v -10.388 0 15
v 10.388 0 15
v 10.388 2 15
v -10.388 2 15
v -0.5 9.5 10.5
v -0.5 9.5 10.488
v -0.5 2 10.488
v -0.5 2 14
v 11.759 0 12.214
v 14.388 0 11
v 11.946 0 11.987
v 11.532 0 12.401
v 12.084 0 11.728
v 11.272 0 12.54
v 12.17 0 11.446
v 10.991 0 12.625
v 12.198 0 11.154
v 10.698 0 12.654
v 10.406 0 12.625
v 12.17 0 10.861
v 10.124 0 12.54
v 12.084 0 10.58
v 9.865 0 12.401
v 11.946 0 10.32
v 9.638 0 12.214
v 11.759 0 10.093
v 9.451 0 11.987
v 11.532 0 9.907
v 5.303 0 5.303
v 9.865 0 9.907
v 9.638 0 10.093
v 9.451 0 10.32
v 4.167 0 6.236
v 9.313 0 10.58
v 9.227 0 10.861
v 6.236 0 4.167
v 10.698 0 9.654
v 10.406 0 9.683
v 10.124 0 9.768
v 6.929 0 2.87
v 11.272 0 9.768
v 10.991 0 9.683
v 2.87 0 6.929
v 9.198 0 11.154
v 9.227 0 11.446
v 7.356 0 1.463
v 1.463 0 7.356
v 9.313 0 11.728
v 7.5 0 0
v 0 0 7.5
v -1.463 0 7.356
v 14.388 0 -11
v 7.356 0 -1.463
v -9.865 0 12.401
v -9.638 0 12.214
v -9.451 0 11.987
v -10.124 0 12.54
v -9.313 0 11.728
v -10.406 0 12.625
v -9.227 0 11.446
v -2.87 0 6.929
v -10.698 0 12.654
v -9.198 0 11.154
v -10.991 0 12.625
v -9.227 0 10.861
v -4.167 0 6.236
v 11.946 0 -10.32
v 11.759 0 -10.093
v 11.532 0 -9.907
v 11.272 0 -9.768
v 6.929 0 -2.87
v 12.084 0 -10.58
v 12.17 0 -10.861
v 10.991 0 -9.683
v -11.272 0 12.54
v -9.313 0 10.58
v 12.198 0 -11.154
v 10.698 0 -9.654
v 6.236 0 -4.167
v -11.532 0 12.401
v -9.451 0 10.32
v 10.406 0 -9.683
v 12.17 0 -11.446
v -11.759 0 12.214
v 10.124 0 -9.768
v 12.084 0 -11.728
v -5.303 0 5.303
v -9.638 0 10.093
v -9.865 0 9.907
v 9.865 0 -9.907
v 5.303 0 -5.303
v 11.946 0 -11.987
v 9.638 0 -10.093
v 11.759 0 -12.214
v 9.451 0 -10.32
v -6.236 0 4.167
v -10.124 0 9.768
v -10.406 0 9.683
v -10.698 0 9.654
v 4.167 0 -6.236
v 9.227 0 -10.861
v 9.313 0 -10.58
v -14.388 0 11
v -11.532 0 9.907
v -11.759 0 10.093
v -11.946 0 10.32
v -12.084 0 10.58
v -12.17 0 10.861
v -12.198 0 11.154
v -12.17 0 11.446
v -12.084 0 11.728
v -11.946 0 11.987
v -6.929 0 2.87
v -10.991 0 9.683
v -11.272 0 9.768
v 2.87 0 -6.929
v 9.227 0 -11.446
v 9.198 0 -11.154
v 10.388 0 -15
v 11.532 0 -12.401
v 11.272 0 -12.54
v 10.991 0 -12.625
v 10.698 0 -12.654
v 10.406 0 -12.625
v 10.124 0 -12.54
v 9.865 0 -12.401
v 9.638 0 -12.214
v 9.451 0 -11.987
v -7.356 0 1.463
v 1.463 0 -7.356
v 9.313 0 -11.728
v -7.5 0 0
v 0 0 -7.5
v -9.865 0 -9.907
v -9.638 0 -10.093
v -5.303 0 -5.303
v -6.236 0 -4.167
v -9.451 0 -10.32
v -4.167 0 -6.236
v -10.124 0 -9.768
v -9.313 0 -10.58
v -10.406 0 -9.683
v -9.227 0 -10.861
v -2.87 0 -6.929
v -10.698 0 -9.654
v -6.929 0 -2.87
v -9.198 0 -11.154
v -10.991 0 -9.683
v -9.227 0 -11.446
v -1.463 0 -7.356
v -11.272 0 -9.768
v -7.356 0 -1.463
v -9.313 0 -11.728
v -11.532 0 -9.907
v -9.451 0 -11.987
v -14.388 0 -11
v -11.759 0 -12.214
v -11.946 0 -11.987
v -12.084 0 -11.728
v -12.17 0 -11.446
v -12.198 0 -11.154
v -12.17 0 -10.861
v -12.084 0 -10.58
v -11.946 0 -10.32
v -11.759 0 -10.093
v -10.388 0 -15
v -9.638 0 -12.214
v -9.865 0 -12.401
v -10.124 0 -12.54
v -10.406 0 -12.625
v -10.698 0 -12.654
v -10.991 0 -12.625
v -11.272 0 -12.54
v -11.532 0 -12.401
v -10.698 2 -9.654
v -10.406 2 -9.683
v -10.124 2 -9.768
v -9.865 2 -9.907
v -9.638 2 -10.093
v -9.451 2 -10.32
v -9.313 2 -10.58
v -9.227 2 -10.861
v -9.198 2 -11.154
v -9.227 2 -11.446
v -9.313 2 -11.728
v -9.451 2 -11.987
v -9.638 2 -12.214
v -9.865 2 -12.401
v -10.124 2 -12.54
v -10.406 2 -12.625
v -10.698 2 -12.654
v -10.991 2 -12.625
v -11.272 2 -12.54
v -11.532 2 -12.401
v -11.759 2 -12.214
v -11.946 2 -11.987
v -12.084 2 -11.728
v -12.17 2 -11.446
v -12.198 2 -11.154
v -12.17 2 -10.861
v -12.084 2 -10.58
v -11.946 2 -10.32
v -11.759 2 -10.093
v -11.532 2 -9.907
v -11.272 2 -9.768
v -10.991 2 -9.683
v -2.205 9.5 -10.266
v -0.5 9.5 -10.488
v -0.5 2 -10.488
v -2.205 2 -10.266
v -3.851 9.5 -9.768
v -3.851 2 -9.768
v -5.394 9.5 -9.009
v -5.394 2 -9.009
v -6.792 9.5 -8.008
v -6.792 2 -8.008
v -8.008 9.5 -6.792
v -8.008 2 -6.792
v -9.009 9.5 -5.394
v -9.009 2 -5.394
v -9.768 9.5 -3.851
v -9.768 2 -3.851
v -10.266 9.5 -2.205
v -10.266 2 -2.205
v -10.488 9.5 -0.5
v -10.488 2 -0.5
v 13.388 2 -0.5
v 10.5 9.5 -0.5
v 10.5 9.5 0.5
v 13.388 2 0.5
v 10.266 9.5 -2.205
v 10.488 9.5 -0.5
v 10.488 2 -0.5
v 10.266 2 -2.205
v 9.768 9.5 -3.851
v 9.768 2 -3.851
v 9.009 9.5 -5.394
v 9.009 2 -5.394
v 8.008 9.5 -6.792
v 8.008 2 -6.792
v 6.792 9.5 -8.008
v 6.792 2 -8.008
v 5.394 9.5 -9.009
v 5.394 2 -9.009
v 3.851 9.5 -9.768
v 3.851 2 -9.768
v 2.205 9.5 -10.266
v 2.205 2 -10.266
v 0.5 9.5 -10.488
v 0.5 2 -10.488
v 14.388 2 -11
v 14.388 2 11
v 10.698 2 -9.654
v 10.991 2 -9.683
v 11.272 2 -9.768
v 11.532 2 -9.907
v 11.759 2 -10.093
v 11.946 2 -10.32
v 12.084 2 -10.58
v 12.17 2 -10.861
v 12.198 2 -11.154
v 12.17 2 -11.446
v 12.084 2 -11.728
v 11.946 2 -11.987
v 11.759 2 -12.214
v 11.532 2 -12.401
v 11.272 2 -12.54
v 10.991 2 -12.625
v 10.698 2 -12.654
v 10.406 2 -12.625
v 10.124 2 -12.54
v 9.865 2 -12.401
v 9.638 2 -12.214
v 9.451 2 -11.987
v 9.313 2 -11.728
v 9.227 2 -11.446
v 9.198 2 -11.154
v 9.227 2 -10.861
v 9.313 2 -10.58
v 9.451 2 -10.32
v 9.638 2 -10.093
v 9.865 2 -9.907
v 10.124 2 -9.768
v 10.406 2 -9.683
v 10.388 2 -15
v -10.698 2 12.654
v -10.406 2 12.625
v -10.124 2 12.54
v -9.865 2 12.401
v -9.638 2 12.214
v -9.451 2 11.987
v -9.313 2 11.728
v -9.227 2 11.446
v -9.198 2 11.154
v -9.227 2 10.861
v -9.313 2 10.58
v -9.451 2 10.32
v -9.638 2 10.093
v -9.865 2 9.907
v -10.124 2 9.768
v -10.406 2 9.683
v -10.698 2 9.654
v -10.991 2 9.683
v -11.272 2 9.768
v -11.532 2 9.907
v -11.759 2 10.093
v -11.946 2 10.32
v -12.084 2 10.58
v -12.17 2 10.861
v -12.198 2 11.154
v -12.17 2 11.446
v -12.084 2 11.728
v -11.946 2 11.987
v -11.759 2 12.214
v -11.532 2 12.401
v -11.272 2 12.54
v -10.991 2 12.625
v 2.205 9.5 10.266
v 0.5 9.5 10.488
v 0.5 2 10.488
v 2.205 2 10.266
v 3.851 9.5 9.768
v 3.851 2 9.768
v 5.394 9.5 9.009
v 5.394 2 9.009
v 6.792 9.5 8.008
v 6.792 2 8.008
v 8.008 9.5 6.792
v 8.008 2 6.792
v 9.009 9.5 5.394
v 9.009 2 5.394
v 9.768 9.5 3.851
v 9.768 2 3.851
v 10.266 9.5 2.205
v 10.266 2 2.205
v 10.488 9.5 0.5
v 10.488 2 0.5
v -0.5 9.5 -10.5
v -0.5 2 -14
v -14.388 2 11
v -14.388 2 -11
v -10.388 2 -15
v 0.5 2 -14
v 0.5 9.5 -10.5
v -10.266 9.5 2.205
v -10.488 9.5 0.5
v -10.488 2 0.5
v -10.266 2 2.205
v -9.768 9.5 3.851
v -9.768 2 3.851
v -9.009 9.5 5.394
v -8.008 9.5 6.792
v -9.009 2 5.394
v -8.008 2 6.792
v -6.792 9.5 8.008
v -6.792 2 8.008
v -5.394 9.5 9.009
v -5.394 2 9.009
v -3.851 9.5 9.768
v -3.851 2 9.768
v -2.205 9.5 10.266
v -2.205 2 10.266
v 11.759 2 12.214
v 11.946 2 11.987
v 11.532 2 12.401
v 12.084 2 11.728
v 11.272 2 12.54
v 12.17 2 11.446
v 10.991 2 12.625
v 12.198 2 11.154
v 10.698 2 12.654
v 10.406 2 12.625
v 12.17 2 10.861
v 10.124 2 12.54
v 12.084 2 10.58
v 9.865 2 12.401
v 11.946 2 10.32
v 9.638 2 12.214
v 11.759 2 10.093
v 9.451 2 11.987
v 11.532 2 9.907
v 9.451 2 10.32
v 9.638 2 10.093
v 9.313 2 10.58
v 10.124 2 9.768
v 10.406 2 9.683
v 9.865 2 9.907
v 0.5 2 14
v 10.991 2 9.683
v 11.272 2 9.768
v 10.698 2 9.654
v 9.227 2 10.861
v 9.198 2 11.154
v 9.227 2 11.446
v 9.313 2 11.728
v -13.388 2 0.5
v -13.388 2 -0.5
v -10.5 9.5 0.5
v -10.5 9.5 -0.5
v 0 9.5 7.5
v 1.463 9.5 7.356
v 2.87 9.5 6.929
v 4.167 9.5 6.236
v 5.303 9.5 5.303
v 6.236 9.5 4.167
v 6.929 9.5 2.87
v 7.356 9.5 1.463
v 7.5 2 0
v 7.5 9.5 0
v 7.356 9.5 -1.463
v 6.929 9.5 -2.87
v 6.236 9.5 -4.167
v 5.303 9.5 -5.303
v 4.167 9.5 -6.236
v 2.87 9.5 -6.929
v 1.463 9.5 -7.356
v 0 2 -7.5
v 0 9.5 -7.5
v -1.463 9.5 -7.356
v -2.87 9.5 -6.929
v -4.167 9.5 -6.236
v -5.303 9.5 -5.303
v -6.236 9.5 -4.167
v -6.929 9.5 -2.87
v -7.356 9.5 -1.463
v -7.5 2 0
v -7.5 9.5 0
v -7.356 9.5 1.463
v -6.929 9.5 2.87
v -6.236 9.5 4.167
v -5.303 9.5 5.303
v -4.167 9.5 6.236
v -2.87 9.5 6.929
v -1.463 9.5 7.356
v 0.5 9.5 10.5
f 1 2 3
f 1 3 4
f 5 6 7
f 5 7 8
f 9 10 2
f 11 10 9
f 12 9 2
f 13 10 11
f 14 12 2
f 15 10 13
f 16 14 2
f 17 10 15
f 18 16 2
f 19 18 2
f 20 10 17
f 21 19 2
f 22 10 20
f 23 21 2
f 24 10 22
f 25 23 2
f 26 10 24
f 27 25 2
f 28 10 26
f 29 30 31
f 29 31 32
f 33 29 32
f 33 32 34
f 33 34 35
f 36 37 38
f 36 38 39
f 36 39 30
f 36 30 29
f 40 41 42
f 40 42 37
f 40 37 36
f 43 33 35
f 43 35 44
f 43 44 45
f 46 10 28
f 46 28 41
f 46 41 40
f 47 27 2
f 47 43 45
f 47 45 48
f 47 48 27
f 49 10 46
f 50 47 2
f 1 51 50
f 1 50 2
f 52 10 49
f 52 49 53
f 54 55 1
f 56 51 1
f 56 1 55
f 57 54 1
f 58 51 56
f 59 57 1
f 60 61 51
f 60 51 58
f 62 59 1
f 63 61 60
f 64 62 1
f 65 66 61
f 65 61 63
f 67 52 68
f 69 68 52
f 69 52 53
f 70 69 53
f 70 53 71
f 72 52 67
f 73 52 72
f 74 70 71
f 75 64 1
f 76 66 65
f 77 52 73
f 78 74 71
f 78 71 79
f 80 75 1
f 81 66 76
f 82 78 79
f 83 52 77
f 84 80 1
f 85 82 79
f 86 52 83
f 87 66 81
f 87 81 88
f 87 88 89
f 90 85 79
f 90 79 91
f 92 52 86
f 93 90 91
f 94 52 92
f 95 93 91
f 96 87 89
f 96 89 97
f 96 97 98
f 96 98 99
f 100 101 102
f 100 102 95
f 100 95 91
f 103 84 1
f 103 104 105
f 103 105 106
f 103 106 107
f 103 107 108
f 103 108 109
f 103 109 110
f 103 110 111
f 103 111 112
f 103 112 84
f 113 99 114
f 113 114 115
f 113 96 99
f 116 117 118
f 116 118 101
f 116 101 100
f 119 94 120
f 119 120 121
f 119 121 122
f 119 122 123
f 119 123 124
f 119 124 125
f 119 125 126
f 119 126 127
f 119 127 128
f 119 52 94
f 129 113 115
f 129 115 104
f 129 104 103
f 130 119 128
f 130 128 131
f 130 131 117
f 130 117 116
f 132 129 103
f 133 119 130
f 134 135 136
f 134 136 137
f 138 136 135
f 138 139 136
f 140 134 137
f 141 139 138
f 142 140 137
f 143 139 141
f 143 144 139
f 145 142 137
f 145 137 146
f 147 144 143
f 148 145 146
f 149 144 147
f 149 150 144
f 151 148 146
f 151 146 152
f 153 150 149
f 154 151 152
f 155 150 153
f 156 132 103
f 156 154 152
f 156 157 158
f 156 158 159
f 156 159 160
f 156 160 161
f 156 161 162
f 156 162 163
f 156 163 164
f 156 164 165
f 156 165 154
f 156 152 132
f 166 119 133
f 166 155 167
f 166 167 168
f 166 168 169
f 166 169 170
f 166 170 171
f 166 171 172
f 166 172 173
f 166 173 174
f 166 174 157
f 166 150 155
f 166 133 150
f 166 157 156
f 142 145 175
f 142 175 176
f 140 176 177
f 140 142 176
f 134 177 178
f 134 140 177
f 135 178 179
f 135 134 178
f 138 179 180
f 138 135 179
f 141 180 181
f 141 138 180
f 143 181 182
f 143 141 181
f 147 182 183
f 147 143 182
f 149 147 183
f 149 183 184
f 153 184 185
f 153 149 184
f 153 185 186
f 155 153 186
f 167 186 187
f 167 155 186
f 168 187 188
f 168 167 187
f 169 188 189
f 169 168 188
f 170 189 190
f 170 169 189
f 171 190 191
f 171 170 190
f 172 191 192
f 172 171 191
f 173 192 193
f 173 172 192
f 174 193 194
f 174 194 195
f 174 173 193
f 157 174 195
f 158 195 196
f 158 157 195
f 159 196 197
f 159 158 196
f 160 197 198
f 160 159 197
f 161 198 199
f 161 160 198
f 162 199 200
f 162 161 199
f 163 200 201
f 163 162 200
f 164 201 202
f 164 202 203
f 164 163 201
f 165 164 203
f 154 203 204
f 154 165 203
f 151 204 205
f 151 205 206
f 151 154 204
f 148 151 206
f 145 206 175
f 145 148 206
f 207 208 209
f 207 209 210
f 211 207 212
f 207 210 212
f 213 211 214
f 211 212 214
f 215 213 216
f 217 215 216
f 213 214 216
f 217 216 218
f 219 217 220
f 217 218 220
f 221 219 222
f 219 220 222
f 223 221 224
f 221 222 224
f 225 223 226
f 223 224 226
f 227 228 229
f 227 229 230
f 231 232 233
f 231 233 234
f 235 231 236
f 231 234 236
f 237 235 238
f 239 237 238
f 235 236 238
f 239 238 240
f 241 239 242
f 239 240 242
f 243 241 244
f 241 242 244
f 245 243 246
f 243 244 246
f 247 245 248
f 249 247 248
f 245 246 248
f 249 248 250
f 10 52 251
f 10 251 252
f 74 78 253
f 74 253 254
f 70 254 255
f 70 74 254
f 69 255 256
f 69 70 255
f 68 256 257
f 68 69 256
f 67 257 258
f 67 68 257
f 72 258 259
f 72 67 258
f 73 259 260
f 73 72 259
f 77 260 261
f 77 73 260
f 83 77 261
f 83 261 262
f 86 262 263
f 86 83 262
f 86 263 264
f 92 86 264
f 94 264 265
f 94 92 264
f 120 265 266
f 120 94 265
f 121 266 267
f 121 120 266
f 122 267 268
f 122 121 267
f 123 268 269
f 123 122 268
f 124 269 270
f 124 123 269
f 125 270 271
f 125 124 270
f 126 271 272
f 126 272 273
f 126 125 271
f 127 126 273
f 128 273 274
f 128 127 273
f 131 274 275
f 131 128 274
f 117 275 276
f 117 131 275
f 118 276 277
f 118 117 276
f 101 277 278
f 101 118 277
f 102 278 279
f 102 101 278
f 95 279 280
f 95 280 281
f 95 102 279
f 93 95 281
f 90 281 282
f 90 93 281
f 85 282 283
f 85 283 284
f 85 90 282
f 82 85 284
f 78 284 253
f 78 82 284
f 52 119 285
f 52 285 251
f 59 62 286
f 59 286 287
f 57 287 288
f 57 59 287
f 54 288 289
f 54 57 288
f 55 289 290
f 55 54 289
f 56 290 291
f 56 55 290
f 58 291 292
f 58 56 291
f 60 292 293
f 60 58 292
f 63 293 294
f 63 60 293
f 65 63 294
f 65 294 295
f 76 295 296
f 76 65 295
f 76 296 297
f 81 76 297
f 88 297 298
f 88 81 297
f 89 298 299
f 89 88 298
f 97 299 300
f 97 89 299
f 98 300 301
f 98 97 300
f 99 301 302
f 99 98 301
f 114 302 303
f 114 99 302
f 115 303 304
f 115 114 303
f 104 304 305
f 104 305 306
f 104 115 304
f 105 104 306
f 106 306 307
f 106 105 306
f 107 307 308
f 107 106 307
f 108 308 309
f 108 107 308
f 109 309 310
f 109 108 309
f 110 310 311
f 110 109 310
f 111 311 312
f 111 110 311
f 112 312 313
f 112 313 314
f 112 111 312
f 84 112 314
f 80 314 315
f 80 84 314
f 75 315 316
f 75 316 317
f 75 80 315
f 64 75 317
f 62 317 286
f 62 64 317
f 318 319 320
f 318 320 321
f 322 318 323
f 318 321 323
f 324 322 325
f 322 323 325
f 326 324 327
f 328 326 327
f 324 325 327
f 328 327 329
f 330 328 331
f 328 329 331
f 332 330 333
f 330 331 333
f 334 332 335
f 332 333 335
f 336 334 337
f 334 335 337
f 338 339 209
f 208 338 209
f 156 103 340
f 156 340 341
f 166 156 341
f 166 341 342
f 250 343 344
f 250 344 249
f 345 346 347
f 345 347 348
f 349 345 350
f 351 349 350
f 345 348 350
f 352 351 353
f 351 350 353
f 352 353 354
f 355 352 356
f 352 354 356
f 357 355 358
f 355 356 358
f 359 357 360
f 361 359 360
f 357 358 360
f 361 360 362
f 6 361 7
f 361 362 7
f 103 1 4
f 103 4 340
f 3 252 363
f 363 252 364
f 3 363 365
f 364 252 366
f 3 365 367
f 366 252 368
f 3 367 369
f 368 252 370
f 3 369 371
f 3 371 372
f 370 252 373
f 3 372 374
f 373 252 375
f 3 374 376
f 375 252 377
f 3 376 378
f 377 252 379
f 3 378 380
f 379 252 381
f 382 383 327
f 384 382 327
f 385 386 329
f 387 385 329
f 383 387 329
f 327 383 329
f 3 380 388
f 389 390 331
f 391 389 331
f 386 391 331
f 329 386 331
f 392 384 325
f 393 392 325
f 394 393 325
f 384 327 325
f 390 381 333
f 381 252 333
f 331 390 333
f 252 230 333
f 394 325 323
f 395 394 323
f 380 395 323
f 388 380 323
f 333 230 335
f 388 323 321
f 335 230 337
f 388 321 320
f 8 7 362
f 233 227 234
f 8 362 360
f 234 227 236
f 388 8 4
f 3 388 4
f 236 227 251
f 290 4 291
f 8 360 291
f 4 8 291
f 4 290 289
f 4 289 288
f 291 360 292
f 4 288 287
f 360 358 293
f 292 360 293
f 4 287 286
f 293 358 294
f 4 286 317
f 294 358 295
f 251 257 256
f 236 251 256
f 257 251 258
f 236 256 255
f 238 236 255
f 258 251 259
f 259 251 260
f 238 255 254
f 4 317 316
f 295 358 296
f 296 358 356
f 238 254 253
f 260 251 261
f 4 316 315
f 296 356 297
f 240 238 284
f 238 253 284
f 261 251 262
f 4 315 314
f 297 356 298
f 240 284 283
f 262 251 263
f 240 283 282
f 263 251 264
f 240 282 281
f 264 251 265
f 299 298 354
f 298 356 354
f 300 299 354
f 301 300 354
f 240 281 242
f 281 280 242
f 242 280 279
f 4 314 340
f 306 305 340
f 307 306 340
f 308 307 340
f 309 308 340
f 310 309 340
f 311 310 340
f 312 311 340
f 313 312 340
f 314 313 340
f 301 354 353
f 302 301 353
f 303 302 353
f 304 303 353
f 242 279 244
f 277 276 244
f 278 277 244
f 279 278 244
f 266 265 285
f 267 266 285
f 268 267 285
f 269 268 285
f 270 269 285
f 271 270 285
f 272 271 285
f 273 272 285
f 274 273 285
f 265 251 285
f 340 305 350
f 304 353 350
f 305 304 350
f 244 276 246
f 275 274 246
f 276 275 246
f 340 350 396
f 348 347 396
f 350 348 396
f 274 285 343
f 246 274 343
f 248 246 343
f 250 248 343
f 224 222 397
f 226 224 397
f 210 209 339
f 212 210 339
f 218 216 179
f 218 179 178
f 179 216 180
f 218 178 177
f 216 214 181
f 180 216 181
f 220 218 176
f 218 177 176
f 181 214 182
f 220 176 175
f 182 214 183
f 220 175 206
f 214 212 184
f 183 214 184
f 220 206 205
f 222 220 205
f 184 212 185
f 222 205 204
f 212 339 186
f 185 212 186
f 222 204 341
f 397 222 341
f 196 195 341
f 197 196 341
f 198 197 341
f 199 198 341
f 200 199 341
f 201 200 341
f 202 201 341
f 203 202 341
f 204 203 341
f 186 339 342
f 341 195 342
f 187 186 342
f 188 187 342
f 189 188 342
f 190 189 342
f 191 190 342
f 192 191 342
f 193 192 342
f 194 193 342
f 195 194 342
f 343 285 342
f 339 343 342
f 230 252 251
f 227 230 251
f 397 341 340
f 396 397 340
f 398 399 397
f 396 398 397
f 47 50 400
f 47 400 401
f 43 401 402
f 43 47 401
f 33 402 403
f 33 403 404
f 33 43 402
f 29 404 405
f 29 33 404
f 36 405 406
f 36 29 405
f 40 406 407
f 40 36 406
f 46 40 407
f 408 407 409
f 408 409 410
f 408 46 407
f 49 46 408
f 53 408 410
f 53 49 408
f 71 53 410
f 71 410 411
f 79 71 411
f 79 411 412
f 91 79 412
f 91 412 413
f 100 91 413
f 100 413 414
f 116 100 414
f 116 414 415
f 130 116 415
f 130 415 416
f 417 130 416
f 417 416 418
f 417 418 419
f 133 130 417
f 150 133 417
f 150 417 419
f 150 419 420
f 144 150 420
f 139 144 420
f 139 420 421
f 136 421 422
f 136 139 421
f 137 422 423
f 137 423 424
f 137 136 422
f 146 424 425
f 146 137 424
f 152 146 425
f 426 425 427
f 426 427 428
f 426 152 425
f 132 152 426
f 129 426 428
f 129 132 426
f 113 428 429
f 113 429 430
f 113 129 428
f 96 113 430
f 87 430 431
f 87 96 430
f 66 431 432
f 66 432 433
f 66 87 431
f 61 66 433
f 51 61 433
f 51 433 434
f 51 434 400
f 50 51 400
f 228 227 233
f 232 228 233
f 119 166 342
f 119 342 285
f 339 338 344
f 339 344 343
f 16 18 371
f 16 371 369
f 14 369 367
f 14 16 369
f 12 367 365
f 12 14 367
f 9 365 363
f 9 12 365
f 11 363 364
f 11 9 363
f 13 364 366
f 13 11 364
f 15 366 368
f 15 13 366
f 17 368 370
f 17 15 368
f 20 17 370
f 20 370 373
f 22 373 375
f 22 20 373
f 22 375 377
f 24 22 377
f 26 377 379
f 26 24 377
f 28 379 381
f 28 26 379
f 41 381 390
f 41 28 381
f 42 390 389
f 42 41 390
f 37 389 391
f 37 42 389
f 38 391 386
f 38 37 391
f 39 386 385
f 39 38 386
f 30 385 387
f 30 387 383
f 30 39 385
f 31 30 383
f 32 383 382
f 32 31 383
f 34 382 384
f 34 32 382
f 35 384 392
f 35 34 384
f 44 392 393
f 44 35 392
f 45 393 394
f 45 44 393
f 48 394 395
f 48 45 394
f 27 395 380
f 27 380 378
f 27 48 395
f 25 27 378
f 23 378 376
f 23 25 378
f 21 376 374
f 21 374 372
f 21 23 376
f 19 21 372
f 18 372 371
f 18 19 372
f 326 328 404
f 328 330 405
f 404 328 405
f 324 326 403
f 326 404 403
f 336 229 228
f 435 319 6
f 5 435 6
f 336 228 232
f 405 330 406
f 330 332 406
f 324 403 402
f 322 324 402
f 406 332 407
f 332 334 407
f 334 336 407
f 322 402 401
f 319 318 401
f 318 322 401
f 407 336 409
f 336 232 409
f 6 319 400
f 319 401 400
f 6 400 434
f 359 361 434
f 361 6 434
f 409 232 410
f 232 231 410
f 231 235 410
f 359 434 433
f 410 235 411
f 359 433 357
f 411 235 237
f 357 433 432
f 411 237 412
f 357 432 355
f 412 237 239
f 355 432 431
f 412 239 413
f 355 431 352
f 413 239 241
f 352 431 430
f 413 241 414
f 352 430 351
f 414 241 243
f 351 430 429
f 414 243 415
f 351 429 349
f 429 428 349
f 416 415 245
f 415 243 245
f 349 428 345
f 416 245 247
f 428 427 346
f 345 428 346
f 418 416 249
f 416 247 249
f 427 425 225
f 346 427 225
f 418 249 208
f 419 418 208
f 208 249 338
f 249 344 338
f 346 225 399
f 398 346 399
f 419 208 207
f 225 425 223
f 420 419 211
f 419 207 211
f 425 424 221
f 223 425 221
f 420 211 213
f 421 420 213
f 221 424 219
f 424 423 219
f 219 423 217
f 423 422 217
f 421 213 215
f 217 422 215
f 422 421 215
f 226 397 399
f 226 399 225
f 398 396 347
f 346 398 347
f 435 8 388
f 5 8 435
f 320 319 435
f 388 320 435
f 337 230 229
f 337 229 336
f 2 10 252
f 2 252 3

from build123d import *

# Parameters (mm, degrees)
SKETCH1_R                = 7.5
SKETCH1_R_2              = 1.5
BOSS_EXTRUDE1_DEPTH      = 2
SKETCH2_R                = 10.5
SKETCH2_R_2              = 7.5
BOSS_EXTRUDE2_DEPTH      = 7.5
BOSS_EXTRUDE4_DEPTH      = 0.5
BOSS_EXTRUDE4_DEPTH_BACK = 0.5
BOSS_EXTRUDE5_DEPTH      = 0.5
BOSS_EXTRUDE5_DEPTH_BACK = 0.5


with BuildPart() as part:
    # Sketch1 → Boss-Extrude1 (new body)
    with BuildSketch(Plane(origin=(0, 0, 0), x_dir=(1, 0, 0), z_dir=(0, 1, 0))):
        Polygon((-14.387647793, 11), (-10.387647793, 15), (10.387647793, 15), (14.387647793, 11), (14.387647793, -11), (10.387647793, -15), (-10.387647793, -15), (-14.387647793, -11), align=None)
        with Locations(Location((0, 0, 0), (0, 0, 270))):
            Circle(SKETCH1_R, mode=Mode.SUBTRACT)
        with Locations(Location((-10.69839003, -11.153723858, 0), (0, 0, 270))):
            Circle(SKETCH1_R_2, mode=Mode.SUBTRACT)
        with Locations(Location((-10.69839003, 11.153723858, 0), (0, 0, 270))):
            Circle(SKETCH1_R_2, mode=Mode.SUBTRACT)
        with Locations(Location((10.69839003, 11.153723858, 0), (0, 0, 270))):
            Circle(SKETCH1_R_2, mode=Mode.SUBTRACT)
        with Locations(Location((10.69839003, -11.153723858, 0), (0, 0, 270))):
            Circle(SKETCH1_R_2, mode=Mode.SUBTRACT)
    extrude(amount=BOSS_EXTRUDE1_DEPTH)

    # Sketch2 → Boss-Extrude2 (add)
    with BuildSketch(Plane(origin=(0, 2, 0), x_dir=(1, 0, 0), z_dir=(0, 1, 0))):
        with Locations(Location((0, 0, 0), (0, 0, 90))):
            Circle(SKETCH2_R)
        with Locations(Location((0, 0, 0), (0, 0, 270))):
            Circle(SKETCH2_R_2, mode=Mode.SUBTRACT)
    extrude(amount=BOSS_EXTRUDE2_DEPTH)

    # Sketch4 → Boss-Extrude4 (add, two sides: drawn at the far end of the back side and taken through both)
    with BuildSketch(Plane(origin=(0, 0, 0), x_dir=(0, 0, -1), z_dir=(1, 0, 0)).offset(-BOSS_EXTRUDE4_DEPTH_BACK)):
        Polygon((10.5, 9.5), (14, 2), (7.5, 2), (7.5, 9.5), align=None)
        Polygon((-10.5, 9.5), (-7.5, 9.5), (-7.5, 2), (-14, 2), align=None)
    extrude(amount=BOSS_EXTRUDE4_DEPTH + BOSS_EXTRUDE4_DEPTH_BACK)

    # Sketch5 → Boss-Extrude5 (add, two sides: drawn at the far end of the back side and taken through both)
    with BuildSketch(Plane.XY.offset(-BOSS_EXTRUDE5_DEPTH_BACK)):
        Polygon((-10.5, 9.5), (-13.387647793, 2), (-7.5, 2), (-7.5, 9.5), align=None)
        Polygon((10.5, 9.5), (13.387647793, 2), (7.5, 2), (7.5, 9.5), align=None)
    extrude(amount=BOSS_EXTRUDE5_DEPTH + BOSS_EXTRUDE5_DEPTH_BACK)


solid = part.part
